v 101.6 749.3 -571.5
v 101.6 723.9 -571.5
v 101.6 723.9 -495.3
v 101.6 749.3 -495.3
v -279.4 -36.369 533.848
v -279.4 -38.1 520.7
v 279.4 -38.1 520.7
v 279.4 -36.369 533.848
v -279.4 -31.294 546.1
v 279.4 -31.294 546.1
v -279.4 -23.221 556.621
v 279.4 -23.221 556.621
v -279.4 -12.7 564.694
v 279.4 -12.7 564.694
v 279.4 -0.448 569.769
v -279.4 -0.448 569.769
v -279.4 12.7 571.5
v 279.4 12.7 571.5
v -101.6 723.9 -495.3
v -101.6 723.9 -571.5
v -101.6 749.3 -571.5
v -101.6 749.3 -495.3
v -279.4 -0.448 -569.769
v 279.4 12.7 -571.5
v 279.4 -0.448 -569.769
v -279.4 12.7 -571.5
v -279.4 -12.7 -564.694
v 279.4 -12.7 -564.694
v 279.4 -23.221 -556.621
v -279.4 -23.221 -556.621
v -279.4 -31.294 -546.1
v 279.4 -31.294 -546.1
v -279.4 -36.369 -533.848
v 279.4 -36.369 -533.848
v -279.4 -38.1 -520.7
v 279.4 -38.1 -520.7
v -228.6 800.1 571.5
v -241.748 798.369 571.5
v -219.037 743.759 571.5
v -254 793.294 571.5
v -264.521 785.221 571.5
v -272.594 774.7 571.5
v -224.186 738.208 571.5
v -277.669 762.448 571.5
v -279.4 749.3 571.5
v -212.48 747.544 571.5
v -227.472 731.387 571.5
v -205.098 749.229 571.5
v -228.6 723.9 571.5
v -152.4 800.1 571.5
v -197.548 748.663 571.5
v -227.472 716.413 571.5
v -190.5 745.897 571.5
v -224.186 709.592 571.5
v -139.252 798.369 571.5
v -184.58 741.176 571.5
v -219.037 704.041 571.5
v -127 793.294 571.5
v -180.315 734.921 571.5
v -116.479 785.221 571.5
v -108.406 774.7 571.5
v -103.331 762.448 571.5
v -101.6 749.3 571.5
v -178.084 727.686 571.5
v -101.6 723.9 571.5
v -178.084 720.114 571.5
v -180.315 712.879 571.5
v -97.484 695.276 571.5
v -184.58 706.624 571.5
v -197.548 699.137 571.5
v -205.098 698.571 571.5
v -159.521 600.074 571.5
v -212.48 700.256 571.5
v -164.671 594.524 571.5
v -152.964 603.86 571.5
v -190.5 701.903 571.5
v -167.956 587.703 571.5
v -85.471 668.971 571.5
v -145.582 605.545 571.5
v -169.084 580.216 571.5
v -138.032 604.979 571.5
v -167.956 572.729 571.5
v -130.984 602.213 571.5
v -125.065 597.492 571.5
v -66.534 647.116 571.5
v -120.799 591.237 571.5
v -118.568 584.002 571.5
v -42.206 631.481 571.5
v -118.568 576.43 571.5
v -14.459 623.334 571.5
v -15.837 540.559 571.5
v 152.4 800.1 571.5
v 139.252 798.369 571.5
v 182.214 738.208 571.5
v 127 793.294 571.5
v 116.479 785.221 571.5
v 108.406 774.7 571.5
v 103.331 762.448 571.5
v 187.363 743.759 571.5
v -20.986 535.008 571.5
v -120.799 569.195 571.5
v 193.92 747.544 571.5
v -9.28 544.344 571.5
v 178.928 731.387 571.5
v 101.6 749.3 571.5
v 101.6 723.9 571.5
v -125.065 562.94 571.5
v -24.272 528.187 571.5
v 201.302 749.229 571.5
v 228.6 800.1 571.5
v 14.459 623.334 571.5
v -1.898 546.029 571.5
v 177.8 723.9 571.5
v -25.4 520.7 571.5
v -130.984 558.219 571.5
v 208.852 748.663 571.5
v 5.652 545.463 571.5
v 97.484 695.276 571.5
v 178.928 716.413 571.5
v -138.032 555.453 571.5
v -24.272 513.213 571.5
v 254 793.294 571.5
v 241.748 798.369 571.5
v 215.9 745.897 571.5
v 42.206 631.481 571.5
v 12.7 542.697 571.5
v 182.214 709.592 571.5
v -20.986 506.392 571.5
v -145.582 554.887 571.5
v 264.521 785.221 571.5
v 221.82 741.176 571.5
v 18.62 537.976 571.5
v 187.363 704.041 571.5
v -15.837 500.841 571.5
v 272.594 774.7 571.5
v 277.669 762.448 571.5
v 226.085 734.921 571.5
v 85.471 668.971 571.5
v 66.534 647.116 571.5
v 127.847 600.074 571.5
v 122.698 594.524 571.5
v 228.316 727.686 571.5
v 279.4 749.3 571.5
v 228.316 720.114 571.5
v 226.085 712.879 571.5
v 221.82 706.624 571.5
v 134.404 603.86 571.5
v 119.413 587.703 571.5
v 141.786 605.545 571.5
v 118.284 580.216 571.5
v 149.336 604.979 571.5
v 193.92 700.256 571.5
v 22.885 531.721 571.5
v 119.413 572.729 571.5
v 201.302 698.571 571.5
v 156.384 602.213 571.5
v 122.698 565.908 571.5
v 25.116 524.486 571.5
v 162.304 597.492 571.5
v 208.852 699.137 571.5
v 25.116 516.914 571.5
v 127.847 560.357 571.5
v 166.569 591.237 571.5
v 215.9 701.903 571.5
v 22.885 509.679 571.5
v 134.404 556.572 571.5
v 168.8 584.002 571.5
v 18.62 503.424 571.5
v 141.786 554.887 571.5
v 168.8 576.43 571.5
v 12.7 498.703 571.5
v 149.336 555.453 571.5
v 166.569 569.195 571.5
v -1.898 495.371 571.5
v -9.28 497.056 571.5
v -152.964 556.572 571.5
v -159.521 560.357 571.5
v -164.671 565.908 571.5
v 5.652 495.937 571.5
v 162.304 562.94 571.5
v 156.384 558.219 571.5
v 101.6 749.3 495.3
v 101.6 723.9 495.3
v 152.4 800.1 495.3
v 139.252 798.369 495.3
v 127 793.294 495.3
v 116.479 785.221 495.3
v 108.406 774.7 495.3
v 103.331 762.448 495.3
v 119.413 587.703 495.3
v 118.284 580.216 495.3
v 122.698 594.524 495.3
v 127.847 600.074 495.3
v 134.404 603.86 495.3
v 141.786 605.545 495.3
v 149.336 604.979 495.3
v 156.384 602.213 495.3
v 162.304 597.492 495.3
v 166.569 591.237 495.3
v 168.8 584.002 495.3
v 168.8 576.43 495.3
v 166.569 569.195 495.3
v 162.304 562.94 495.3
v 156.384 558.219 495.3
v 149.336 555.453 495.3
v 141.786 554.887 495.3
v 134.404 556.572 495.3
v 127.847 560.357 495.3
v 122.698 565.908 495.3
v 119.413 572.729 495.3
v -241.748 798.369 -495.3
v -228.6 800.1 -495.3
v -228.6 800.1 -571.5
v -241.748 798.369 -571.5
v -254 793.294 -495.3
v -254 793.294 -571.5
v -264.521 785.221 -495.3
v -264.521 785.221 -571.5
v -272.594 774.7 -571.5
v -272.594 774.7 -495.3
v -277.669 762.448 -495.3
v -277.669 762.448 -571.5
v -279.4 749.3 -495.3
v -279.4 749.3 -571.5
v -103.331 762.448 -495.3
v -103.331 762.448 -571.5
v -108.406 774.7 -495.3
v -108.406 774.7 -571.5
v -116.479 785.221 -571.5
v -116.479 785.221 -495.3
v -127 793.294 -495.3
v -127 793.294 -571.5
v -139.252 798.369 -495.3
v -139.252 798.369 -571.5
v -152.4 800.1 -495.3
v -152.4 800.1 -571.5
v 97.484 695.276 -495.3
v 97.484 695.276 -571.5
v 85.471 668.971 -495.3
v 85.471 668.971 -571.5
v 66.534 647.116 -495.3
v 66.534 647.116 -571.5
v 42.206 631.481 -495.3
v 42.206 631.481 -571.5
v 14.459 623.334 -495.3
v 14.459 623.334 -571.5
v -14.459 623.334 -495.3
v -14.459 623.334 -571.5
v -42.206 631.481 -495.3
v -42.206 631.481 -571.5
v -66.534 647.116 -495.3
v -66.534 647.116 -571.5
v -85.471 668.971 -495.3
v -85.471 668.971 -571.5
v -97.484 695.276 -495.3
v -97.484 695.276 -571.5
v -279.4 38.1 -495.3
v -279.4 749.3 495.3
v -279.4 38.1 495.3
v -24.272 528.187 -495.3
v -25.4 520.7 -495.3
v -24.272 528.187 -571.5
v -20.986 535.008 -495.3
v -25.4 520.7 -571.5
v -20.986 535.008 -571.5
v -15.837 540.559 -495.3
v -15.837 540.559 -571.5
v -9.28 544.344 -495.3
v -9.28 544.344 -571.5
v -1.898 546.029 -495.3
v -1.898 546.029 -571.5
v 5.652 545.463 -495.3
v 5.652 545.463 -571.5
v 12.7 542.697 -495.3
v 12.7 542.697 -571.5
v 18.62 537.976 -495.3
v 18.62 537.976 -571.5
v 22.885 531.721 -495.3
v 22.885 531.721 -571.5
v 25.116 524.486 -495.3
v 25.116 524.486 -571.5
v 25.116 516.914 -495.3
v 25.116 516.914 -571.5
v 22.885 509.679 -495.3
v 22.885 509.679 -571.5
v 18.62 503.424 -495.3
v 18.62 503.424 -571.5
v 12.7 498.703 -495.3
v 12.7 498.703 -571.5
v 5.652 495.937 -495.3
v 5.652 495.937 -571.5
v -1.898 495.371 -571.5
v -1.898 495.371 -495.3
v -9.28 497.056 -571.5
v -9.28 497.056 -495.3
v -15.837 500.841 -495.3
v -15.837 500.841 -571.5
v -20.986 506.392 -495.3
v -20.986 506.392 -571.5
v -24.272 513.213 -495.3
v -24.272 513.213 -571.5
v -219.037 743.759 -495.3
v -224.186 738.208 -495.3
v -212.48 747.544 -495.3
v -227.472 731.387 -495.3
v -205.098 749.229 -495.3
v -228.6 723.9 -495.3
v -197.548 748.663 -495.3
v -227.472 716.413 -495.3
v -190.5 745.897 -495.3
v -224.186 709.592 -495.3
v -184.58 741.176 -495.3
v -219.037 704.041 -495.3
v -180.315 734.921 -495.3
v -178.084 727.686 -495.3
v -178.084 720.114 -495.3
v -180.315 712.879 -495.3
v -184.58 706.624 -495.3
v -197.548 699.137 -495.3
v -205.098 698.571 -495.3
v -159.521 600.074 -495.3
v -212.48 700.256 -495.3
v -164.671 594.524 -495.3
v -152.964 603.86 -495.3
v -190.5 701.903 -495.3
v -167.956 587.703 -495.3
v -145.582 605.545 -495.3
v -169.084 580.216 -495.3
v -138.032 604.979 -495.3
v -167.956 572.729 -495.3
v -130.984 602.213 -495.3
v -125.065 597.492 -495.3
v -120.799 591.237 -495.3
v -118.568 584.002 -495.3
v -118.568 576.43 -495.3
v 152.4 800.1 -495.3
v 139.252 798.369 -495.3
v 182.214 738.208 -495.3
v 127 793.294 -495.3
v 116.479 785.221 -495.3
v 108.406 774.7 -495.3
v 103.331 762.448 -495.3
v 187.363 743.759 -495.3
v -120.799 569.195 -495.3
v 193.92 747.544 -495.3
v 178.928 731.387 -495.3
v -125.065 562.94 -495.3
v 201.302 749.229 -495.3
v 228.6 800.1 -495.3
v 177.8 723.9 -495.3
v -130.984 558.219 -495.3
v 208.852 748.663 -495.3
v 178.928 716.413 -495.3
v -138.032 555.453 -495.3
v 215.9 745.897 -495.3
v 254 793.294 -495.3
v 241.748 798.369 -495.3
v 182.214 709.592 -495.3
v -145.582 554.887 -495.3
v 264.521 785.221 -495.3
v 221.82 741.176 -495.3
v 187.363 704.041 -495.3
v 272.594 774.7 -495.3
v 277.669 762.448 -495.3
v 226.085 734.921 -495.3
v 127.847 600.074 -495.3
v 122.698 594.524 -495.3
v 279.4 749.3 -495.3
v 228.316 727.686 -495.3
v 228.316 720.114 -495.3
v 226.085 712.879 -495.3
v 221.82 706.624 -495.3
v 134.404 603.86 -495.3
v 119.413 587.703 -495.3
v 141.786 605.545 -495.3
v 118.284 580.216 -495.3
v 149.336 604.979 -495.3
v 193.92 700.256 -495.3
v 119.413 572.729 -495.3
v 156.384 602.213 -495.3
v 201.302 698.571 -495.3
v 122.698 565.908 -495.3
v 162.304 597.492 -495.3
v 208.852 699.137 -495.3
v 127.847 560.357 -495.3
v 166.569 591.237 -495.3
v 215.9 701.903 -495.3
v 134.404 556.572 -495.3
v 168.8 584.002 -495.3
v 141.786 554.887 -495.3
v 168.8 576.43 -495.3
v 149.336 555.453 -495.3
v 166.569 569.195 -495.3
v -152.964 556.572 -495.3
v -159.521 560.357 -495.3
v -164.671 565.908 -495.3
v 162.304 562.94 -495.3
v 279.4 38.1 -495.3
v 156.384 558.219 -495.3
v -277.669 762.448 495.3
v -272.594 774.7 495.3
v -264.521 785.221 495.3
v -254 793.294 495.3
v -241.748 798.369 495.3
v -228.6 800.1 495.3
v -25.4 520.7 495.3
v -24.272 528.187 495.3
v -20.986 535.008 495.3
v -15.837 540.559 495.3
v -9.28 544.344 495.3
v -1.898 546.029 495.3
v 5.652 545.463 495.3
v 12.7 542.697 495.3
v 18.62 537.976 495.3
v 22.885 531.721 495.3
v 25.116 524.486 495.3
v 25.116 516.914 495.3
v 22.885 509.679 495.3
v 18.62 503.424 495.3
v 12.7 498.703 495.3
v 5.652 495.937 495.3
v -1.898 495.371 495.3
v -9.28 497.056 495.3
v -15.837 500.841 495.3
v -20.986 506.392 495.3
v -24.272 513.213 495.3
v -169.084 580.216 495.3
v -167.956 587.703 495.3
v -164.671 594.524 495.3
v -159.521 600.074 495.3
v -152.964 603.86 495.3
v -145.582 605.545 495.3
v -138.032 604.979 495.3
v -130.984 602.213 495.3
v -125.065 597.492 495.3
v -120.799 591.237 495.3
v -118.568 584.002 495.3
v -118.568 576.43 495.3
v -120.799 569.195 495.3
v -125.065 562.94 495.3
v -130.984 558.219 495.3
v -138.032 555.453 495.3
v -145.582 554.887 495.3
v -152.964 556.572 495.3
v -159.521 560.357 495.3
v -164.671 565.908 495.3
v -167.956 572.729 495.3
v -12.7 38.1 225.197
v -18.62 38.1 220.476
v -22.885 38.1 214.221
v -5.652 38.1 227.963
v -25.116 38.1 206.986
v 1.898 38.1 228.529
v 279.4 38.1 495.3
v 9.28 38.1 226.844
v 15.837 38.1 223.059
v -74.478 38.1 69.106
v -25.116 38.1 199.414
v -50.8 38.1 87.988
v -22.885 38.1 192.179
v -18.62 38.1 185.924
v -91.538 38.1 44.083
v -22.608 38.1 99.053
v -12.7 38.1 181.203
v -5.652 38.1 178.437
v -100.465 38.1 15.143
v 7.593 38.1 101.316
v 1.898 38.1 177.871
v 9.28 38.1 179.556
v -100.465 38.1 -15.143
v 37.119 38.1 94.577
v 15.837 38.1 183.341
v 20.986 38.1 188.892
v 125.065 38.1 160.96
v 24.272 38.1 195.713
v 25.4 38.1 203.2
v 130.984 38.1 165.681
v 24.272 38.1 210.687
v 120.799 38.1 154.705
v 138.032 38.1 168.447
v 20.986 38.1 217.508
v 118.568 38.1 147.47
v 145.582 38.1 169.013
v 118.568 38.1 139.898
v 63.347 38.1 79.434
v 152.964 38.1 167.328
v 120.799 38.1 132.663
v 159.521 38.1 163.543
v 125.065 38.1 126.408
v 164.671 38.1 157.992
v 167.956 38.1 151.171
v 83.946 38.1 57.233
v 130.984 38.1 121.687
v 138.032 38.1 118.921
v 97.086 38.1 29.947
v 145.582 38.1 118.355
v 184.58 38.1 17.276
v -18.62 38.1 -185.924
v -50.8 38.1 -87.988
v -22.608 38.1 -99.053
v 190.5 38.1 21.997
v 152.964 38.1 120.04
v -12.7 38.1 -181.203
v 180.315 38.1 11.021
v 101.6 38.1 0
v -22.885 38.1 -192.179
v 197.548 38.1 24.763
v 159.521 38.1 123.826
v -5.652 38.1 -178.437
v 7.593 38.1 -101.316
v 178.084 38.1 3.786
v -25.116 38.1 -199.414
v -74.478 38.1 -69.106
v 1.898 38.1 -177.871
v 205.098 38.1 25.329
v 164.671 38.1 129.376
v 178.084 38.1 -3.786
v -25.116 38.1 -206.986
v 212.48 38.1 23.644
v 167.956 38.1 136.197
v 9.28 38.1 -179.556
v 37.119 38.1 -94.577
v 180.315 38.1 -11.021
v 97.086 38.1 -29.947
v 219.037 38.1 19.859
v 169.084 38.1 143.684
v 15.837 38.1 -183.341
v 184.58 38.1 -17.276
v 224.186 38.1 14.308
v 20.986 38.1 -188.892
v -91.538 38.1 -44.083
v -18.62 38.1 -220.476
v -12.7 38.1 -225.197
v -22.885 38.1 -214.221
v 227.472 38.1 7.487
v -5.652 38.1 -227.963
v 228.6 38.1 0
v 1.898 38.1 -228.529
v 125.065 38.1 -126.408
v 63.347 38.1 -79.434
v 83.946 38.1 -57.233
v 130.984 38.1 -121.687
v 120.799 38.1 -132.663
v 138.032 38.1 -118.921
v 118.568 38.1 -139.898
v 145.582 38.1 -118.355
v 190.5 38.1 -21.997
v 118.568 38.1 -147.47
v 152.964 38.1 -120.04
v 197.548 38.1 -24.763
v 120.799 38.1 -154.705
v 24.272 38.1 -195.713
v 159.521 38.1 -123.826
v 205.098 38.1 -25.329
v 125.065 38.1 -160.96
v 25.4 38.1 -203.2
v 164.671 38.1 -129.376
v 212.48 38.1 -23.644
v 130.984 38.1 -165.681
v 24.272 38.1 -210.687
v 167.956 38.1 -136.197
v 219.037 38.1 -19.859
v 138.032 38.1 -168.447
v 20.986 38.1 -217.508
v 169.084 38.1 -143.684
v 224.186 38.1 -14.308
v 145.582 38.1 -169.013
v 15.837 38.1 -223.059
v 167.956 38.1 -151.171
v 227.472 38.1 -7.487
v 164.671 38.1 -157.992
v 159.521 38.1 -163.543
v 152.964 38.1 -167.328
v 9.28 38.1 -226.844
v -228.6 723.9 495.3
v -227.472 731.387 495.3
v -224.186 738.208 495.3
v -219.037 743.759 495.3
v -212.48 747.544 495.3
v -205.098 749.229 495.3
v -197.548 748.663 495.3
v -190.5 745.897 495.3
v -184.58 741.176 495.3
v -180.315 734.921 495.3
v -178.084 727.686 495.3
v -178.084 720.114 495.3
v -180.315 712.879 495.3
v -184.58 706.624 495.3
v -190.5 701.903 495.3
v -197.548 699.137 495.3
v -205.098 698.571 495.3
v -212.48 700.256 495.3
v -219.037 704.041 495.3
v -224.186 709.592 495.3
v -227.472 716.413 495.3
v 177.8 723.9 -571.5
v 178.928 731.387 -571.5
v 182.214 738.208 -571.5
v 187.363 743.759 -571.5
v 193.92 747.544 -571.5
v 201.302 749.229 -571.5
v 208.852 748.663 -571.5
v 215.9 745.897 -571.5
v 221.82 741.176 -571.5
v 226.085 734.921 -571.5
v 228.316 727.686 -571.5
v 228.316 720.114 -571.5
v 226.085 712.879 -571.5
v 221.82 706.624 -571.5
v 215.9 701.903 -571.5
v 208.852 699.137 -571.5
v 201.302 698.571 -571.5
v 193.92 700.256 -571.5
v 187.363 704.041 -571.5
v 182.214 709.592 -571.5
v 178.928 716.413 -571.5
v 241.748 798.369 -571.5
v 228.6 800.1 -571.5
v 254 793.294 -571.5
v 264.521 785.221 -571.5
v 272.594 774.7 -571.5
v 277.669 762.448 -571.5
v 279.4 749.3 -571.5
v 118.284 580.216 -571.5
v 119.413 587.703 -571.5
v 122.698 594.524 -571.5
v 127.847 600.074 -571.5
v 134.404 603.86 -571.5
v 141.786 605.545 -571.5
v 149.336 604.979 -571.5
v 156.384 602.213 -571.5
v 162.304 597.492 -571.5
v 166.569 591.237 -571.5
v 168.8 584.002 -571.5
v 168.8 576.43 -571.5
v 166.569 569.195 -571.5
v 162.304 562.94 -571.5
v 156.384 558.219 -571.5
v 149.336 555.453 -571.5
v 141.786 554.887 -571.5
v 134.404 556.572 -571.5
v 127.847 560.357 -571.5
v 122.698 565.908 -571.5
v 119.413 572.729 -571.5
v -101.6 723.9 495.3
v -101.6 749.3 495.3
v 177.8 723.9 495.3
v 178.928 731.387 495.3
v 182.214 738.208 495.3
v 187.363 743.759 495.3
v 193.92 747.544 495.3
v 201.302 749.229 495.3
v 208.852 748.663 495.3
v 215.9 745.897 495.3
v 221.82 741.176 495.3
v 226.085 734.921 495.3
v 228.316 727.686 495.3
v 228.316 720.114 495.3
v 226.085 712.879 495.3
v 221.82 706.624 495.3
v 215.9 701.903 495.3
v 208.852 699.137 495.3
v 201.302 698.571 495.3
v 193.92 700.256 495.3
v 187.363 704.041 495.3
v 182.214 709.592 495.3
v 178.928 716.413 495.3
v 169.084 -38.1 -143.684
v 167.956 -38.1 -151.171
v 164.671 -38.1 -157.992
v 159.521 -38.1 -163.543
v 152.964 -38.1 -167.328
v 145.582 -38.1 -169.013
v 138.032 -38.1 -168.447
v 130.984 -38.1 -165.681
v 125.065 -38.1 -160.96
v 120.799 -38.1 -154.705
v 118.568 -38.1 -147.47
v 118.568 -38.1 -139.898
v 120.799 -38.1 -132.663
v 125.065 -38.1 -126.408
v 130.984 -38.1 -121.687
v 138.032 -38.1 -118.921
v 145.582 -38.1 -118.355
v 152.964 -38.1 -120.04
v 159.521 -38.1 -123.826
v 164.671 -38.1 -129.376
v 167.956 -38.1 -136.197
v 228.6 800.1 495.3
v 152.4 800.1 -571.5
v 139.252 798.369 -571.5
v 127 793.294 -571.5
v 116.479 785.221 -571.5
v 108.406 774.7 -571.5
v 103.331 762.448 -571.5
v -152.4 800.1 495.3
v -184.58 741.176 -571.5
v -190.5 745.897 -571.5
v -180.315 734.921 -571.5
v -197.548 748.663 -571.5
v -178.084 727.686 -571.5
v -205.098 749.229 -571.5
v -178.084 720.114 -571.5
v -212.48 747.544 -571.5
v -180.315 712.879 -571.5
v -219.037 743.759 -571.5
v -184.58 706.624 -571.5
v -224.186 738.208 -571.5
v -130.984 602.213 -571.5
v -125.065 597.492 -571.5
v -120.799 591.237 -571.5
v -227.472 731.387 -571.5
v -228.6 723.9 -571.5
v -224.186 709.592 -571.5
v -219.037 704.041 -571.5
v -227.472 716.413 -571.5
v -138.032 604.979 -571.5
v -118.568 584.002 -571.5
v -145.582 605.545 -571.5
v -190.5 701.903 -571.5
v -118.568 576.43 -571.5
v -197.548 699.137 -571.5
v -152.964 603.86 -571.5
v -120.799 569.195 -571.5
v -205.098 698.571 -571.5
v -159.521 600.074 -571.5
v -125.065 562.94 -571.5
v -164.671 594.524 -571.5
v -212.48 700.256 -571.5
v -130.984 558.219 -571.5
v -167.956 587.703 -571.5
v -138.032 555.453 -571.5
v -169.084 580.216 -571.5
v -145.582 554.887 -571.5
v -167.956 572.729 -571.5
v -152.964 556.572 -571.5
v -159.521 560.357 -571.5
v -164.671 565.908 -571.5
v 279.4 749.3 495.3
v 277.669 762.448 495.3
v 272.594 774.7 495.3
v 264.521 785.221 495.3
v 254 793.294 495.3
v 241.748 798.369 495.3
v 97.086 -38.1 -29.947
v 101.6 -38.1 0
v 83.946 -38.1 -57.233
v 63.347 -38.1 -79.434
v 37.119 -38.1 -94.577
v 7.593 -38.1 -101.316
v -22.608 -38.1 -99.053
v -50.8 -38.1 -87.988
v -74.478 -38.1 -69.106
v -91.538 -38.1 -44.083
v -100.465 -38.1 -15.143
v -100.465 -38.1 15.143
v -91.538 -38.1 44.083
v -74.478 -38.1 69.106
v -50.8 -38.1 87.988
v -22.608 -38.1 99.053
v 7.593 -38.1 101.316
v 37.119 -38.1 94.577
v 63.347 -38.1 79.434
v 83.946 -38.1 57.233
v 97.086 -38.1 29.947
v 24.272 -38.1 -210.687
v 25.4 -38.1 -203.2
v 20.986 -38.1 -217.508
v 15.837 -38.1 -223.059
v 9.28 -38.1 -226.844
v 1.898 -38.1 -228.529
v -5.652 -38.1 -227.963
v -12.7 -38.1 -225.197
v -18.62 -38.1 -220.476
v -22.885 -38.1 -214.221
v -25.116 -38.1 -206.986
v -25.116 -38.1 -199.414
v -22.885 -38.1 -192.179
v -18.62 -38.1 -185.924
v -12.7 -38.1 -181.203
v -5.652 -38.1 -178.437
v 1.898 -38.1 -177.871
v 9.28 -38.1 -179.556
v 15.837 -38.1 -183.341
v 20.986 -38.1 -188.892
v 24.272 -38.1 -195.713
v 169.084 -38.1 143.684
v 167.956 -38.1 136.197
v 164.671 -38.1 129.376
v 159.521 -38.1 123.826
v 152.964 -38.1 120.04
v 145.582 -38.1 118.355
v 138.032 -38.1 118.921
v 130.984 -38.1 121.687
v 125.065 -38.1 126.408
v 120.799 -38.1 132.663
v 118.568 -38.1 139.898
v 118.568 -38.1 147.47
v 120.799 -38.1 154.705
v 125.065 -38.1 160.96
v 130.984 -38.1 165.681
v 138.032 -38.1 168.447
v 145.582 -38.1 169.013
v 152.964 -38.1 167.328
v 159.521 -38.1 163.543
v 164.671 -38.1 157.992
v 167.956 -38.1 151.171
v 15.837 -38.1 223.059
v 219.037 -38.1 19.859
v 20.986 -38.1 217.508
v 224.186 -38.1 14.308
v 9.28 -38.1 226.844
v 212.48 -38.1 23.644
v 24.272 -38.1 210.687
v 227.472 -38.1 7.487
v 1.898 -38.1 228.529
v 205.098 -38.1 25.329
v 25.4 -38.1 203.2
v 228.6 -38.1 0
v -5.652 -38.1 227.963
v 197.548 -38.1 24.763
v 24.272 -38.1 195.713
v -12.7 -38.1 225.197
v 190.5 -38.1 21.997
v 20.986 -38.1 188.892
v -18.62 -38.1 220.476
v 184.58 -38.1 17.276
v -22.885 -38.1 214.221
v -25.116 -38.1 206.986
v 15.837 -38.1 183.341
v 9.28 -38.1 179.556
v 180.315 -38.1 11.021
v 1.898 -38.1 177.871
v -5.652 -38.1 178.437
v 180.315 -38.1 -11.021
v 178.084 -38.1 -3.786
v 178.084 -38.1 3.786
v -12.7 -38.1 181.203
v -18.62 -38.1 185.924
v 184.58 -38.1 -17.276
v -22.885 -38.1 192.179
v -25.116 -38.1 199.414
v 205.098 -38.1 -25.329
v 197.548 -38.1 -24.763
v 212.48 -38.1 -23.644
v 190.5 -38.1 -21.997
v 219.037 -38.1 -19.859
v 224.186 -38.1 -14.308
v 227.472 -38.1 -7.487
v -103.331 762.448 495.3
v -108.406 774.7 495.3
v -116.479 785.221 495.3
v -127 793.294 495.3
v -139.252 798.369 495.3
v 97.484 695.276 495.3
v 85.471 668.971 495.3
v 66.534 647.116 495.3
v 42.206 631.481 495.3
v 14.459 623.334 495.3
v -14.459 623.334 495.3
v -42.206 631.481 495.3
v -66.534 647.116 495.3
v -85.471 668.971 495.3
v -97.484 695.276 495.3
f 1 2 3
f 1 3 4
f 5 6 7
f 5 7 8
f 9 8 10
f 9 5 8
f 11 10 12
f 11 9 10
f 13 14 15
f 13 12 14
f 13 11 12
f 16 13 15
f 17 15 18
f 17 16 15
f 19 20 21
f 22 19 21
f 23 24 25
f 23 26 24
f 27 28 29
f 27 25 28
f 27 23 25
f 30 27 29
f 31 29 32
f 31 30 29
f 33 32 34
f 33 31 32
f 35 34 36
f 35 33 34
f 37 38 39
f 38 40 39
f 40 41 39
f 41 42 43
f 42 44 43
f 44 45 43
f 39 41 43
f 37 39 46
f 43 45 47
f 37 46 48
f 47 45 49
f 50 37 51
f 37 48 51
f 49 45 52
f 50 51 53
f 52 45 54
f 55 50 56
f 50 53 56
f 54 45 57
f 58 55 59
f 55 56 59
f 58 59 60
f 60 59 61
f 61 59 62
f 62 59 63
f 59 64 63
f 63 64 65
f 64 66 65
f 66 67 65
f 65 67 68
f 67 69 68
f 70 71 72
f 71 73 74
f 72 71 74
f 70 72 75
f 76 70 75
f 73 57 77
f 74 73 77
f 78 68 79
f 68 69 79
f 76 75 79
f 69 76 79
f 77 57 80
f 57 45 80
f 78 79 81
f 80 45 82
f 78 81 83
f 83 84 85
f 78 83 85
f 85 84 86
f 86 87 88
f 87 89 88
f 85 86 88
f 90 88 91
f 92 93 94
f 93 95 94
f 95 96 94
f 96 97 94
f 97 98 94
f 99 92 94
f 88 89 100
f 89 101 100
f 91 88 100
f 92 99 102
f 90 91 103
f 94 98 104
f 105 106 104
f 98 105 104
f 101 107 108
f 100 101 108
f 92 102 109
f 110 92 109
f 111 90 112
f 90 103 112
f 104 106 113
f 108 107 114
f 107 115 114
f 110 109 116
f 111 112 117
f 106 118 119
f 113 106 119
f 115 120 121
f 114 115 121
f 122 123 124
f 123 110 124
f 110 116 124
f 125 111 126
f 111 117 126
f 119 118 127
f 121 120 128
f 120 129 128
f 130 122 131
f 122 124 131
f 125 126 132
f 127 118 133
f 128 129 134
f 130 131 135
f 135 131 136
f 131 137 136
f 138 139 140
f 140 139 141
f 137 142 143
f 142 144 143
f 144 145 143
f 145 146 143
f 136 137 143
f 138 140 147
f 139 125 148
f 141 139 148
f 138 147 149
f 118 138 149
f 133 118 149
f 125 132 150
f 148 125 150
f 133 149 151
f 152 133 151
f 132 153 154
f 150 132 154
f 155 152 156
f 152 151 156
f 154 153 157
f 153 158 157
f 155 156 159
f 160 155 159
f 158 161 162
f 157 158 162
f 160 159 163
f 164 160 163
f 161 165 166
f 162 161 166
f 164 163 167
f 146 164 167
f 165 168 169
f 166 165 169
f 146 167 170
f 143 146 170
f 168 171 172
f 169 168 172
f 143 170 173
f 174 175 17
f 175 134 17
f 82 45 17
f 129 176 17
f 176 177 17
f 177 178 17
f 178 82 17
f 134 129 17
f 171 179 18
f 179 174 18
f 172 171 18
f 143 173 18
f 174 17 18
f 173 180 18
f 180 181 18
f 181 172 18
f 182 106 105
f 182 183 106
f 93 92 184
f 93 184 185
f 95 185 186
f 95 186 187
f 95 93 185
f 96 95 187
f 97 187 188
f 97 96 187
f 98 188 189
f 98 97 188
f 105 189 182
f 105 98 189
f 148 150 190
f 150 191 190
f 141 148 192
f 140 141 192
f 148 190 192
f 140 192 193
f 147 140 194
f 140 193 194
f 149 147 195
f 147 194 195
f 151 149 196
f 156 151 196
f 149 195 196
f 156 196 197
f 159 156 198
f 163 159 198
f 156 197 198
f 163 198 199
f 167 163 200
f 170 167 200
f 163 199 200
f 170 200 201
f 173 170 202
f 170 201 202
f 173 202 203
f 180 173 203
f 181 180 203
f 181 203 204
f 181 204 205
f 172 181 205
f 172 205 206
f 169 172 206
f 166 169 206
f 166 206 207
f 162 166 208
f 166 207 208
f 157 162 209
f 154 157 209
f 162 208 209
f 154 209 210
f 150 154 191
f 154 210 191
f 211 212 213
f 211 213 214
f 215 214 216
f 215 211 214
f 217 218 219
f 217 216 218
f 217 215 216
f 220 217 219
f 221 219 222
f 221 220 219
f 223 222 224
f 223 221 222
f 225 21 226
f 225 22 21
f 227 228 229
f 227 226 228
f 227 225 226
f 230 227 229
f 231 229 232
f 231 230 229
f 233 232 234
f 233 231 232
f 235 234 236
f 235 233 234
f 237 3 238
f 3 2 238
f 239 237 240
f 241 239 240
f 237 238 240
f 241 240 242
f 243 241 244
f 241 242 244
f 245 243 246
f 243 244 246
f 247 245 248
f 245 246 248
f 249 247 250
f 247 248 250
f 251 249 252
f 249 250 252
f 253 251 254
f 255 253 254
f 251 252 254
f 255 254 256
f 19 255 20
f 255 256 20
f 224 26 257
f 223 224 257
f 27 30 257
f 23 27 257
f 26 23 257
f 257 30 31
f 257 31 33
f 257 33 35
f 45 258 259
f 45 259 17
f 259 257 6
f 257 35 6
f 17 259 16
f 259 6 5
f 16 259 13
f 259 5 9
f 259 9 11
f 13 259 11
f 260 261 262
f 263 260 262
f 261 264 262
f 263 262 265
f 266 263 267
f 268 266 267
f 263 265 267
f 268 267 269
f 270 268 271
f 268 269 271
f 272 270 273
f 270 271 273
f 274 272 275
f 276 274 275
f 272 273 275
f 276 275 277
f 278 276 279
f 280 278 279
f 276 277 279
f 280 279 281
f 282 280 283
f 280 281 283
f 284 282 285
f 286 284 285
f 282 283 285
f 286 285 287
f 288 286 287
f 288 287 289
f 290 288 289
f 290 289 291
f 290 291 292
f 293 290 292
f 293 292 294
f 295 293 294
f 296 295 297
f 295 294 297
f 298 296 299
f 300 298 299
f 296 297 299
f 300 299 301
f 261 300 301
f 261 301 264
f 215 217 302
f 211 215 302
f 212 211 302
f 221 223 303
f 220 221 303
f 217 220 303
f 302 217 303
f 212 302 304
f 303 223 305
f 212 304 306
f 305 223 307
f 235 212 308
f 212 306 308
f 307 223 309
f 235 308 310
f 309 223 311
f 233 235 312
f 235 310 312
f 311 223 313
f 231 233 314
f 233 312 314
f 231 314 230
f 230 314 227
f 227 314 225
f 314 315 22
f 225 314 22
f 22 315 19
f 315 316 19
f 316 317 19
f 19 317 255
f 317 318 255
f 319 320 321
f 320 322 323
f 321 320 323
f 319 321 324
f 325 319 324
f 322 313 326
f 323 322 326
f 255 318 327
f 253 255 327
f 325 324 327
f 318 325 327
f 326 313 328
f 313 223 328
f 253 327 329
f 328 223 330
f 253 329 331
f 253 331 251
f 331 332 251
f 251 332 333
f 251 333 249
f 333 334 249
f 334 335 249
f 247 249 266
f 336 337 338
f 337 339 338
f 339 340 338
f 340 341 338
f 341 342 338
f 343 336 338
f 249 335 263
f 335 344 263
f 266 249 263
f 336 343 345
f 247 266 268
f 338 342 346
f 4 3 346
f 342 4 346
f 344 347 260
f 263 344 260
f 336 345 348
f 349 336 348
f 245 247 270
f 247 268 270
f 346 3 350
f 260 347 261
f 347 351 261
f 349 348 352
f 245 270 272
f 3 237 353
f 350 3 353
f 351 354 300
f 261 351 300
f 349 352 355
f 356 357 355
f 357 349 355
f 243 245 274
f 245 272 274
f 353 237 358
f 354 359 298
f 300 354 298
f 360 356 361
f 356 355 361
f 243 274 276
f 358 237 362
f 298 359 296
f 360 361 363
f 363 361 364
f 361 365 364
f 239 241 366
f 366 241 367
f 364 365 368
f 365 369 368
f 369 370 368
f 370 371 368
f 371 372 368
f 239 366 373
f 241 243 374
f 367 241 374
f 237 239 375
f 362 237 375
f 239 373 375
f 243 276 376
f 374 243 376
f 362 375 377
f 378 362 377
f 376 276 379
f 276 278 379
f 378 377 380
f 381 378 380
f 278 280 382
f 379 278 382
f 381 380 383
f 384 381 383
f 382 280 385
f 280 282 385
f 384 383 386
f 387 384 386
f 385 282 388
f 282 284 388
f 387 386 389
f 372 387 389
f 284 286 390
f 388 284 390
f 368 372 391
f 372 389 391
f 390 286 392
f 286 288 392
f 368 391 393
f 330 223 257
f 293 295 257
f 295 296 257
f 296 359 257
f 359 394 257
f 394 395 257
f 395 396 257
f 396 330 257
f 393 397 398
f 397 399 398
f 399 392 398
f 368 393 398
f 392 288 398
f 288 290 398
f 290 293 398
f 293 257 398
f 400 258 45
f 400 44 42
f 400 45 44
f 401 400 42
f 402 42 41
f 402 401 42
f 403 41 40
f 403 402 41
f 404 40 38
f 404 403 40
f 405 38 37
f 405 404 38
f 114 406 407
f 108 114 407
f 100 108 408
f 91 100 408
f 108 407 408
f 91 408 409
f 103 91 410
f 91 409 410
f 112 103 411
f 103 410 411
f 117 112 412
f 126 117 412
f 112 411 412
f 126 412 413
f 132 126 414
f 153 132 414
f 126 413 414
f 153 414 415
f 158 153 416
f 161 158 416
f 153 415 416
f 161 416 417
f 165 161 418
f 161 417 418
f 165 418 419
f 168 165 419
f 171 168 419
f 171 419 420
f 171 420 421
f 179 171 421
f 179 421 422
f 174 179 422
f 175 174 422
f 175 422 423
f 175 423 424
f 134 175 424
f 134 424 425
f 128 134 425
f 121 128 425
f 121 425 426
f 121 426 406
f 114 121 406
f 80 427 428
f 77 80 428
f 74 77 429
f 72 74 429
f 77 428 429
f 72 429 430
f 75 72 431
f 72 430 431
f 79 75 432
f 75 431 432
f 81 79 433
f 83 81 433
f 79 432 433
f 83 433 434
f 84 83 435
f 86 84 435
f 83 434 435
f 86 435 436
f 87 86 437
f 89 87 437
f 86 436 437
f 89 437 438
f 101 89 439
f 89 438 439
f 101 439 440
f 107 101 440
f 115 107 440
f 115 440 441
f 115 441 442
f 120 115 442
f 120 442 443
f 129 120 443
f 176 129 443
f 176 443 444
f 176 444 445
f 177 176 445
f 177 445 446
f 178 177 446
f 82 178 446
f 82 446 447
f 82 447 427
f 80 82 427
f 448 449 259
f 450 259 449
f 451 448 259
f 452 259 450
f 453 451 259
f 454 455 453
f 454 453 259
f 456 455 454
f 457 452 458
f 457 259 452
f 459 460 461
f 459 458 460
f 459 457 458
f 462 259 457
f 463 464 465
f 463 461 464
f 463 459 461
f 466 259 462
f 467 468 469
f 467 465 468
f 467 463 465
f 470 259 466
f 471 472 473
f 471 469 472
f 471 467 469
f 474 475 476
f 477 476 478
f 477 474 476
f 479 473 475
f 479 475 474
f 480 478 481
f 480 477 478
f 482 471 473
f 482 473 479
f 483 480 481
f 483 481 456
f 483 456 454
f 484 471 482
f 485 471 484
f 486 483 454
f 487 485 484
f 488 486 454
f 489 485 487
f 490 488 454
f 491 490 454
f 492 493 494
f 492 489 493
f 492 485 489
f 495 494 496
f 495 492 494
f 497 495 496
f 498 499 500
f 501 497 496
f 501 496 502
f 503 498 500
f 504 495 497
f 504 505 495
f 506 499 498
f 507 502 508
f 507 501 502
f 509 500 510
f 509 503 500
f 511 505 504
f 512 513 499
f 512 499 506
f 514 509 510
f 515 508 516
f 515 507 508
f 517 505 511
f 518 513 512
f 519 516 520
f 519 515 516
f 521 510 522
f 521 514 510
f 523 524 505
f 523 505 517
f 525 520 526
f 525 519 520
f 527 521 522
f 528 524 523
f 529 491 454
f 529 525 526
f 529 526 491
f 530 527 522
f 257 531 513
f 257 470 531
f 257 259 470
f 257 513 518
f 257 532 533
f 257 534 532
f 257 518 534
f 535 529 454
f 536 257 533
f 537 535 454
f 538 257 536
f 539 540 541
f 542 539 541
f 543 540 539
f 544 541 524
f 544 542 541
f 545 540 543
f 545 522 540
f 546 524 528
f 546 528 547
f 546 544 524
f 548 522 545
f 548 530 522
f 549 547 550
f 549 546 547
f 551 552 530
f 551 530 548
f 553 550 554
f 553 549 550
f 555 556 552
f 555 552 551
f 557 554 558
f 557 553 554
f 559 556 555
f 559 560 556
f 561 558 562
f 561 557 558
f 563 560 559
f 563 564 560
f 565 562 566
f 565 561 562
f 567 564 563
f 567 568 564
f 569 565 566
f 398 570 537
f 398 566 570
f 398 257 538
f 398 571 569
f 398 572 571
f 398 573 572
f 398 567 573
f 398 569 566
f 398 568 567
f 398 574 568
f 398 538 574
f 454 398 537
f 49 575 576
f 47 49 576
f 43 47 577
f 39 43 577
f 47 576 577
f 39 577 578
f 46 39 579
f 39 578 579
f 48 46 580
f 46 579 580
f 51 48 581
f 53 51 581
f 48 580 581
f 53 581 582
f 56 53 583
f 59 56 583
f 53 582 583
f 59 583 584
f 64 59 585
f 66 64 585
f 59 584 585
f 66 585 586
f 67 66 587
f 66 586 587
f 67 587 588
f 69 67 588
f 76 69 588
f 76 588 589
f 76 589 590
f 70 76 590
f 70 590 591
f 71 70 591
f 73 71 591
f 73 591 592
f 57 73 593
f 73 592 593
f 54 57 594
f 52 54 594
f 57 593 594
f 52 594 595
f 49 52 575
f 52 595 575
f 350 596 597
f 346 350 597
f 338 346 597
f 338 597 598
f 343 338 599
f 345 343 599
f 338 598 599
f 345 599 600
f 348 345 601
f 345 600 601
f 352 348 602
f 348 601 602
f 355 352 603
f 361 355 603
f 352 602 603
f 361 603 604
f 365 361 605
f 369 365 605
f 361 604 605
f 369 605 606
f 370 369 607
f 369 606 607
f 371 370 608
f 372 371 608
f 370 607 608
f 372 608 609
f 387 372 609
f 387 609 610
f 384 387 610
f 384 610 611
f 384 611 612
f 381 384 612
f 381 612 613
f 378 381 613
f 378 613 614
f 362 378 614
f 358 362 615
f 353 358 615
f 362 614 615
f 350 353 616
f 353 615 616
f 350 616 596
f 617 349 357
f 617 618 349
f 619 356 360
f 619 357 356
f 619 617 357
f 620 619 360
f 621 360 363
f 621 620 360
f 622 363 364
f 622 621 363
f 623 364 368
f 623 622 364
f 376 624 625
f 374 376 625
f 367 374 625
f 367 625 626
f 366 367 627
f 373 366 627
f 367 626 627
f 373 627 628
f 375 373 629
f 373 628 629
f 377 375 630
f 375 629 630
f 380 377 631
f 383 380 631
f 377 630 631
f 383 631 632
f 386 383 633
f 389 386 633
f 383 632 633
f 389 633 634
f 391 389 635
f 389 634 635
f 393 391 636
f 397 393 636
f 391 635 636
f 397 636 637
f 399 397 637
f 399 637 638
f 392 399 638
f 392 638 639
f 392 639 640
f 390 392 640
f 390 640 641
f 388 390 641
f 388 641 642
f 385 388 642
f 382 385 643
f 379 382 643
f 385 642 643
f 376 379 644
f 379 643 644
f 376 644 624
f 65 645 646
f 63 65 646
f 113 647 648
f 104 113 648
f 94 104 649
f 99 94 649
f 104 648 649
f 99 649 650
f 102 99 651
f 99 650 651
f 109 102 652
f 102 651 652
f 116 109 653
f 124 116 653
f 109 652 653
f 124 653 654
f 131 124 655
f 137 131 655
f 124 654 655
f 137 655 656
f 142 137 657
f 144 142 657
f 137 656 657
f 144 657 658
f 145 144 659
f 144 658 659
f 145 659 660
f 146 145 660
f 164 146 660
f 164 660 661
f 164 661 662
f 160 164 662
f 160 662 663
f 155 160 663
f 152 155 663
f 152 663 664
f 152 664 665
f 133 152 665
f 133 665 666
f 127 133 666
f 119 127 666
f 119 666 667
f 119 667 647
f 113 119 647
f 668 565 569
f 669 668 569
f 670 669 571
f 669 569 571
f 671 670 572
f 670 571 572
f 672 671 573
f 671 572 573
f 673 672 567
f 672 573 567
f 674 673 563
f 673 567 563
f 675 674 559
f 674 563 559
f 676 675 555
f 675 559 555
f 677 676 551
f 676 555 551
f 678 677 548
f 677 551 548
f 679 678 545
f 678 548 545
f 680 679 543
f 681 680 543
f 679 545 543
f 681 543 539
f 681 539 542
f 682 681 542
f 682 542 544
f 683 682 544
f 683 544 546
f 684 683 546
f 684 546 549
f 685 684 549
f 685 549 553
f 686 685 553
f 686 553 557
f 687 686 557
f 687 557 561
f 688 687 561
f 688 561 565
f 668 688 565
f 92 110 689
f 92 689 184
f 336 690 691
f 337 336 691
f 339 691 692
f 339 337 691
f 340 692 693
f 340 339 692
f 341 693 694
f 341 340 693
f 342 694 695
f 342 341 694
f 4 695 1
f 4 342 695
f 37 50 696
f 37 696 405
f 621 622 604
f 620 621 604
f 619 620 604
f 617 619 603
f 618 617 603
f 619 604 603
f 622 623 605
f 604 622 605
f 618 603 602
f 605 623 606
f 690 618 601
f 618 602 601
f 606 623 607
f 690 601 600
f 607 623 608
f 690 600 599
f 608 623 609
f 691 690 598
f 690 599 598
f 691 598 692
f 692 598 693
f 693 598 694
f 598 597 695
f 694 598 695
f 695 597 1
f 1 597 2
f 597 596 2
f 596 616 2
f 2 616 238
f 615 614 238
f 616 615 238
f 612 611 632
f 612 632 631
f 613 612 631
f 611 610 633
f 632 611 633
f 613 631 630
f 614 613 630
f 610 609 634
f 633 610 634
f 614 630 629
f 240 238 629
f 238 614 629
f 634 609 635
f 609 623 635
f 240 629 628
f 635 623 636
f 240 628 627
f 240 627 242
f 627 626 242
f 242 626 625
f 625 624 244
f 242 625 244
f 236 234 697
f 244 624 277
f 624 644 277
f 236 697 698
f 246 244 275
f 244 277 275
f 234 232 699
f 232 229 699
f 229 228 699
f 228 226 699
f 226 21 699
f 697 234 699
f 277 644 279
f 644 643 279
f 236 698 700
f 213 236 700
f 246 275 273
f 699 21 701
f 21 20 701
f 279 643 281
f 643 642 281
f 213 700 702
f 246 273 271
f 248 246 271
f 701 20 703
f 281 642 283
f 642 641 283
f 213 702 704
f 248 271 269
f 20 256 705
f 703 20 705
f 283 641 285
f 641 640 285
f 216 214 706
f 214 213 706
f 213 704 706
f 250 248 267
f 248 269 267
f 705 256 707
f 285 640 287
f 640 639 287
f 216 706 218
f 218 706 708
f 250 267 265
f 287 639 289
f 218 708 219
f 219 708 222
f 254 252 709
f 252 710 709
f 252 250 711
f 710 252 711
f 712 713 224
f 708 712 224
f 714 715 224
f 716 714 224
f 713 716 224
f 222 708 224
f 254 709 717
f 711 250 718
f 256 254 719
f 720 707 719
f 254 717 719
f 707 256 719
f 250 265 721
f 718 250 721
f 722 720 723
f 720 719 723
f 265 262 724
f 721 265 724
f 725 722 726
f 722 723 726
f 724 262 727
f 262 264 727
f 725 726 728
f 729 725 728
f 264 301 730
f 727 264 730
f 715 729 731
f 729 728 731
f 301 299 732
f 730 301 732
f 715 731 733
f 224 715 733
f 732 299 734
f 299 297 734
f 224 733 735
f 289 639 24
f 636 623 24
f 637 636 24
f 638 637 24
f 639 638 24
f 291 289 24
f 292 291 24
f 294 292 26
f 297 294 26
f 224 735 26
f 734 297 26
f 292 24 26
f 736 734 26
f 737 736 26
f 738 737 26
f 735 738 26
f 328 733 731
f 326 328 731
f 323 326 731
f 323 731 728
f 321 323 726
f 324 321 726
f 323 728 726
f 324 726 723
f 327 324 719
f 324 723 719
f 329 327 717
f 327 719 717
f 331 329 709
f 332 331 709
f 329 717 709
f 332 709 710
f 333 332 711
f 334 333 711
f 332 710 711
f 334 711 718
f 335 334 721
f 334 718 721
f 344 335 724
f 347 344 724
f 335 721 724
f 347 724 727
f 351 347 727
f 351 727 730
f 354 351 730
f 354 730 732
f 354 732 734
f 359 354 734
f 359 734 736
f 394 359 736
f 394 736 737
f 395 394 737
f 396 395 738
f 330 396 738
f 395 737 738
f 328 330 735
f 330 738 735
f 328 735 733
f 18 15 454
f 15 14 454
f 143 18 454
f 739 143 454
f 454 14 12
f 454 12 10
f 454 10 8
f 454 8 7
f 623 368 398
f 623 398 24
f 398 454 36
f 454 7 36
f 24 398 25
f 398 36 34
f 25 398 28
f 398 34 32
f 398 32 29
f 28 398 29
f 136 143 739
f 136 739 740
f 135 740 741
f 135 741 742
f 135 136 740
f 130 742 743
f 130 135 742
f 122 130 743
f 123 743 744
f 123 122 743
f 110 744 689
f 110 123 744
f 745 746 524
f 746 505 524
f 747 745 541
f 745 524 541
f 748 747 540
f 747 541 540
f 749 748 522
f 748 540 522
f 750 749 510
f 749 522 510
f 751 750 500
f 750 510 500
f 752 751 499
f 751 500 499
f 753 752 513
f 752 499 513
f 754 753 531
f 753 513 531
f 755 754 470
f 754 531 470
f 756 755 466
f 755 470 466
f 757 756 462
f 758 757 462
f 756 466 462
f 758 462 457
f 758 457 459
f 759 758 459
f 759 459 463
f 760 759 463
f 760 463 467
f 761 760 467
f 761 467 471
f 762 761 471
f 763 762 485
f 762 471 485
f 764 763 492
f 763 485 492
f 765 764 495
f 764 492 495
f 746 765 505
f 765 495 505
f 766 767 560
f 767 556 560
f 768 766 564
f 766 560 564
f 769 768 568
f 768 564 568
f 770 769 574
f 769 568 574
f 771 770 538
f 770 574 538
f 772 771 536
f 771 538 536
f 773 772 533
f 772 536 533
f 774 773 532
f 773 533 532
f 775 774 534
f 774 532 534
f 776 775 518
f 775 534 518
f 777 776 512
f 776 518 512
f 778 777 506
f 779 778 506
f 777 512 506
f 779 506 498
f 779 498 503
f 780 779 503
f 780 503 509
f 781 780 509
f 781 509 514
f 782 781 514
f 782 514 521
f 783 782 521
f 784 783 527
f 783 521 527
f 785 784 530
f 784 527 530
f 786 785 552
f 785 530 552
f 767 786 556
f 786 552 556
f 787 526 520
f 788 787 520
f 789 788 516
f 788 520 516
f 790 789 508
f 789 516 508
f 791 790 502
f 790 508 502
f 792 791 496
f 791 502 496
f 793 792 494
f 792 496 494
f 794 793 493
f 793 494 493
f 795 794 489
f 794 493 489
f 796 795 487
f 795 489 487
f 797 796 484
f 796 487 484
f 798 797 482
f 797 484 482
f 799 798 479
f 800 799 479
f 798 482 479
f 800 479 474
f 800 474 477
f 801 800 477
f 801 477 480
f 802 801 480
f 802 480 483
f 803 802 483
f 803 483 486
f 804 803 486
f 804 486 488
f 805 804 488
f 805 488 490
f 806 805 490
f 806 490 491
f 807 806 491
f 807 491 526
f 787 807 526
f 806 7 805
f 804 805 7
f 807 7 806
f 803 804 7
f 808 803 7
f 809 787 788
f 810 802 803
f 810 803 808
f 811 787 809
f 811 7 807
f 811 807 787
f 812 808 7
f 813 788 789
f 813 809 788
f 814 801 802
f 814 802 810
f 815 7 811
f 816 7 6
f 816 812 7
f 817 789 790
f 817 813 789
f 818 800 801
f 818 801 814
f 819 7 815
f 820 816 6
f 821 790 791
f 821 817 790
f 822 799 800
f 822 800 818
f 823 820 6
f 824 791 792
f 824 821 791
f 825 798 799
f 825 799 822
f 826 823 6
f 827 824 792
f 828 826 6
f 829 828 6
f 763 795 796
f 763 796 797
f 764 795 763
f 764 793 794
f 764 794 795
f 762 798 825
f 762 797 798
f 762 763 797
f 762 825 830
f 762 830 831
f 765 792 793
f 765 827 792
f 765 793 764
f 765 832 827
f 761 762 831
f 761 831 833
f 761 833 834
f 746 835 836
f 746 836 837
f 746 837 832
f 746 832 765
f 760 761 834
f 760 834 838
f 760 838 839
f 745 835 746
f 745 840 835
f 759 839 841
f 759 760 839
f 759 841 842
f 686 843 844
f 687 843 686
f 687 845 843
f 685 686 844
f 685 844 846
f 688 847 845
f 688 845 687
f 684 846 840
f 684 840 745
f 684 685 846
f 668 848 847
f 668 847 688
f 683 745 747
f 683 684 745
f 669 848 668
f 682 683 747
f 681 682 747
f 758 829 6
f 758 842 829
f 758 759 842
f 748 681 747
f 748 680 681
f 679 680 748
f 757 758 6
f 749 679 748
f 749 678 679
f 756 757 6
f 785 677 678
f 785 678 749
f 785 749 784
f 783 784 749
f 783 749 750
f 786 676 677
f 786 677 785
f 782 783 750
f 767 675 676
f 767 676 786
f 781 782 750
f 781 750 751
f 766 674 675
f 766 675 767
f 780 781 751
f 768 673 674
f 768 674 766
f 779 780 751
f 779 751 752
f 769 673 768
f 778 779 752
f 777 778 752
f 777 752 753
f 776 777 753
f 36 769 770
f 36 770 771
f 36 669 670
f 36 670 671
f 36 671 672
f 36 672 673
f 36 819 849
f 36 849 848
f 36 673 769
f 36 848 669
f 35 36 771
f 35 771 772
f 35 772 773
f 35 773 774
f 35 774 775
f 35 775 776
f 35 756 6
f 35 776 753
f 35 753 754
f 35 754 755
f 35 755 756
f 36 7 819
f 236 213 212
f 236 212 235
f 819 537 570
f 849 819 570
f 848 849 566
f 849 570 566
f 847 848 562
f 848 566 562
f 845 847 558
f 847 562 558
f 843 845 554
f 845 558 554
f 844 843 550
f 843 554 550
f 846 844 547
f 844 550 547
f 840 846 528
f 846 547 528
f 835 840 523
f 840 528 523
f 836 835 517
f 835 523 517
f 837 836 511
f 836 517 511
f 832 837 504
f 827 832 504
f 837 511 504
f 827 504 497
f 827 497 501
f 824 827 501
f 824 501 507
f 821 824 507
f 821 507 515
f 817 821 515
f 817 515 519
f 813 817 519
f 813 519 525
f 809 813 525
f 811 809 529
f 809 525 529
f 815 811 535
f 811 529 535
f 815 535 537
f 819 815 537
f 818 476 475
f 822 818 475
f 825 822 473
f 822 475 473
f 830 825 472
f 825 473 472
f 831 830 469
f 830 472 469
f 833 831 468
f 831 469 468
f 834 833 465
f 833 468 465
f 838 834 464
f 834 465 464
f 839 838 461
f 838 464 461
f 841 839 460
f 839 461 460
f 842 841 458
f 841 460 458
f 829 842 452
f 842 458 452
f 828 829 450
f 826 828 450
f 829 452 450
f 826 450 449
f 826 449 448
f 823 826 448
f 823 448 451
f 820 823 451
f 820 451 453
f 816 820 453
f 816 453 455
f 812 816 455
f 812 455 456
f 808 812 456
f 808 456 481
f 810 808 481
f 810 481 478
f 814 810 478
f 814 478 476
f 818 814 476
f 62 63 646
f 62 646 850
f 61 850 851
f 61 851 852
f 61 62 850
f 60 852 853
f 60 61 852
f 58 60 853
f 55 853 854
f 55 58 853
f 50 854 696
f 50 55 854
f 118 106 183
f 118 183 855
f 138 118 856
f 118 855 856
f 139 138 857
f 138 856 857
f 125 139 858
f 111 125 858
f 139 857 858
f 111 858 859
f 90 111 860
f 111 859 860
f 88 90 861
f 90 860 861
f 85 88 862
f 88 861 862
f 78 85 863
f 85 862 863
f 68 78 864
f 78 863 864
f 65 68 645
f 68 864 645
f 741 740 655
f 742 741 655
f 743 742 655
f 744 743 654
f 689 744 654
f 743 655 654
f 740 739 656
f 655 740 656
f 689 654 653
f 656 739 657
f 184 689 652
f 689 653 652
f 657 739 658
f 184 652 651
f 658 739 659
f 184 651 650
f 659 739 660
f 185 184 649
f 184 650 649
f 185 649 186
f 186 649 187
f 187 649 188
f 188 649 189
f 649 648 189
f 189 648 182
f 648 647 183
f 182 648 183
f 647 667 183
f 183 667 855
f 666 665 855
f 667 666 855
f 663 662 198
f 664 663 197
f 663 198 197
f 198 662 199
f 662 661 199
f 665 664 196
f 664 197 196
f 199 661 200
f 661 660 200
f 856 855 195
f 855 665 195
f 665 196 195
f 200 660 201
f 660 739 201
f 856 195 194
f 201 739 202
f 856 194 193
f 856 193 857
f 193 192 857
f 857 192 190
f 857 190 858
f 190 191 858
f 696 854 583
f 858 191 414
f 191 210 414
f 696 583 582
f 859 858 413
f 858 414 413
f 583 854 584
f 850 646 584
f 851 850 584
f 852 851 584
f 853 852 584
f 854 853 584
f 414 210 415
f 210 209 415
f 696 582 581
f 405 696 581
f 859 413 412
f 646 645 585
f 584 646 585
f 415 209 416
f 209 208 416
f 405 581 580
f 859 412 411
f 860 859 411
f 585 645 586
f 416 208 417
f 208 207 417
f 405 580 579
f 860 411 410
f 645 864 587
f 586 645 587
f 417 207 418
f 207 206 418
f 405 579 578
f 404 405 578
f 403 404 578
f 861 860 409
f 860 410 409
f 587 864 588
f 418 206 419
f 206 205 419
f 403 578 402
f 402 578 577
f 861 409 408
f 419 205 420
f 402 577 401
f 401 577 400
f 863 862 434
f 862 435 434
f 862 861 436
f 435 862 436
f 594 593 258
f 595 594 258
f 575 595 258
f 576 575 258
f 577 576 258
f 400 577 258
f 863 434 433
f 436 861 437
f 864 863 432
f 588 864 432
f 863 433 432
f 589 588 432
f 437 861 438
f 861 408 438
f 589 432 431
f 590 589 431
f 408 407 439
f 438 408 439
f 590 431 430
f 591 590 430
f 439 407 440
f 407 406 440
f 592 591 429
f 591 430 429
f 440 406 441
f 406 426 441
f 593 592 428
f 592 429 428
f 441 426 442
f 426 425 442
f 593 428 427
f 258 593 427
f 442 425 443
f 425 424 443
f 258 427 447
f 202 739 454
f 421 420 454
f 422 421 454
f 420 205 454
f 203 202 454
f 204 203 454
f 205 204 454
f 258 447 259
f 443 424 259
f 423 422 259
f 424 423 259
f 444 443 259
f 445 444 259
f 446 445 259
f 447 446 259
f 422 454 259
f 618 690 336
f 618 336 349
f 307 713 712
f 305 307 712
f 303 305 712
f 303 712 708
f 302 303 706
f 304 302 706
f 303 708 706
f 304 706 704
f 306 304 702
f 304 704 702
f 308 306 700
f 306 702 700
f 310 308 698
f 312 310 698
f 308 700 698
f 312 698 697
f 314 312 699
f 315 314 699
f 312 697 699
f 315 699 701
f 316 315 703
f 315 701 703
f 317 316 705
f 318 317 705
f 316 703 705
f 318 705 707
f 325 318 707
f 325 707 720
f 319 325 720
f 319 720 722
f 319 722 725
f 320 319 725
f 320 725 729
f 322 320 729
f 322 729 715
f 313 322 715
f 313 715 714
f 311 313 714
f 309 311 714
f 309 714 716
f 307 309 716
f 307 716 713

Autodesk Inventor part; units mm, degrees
ref_plane "YZ Plane" through (0, 0, 0) normal (1, 0, 0) x (0, 1, 0)
ref_plane "XZ Plane" through (0, 0, 0) normal (0, 1, 0) x (-1, 0, 0)
ref_plane "XY Plane" through (0, 0, 0) normal (0, 0, 1) x (1, 0, 0)
sketch "Sketch1" plane through (0, 0, 0) normal (0, 0, 1) x (1, 0, 0)
  line L0 (-279.4, 38.1) -> (279.4, 38.1)
  line L1 (279.4, 38.1) -> (279.4, -38.1)
  line L2 (279.4, -38.1) -> (-279.4, -38.1)
  line L3 (-279.4, -38.1) -> (-279.4, 38.1)
  line L4 (0, 0) -> (0, 412.8984) construction
  line L5 (0, 0) -> (748.8943, 0) construction
  dimension "d0" = 558.8
  dimension "d1" = 76.2
  dimension "d2" = 38.1
  dimension "d4" = 279.4
extrude "Extrusion1" add sketch "Sketch1" along normal mid plane 1143
sketch "Sketch2" plane through (-279.4, 38.1, 571.5) normal (0, 1, 0) x (1, 0, 0)
  line L0 (558.8, 0) -> (558.8, 1143) projected
  line L1 (0, 1143) -> (0, 0) projected
  line L2 (558.8, 1143) -> (0, 1143)
  line L3 (0, 1143) -> (0, 1066.8)
  line L4 (0, 1066.8) -> (558.8, 1066.8)
  line L5 (558.8, 1066.8) -> (558.8, 1143)
  point P0 (279.4, 571.5)
  dimension "d7" = 76.2
extrude "Extrusion2" add sketch "Sketch2" along normal blind 762
mirror "Mirror1" about plane through (0, 0, 0) normal (0, 0, 1) of "Extrusion2"
sketch "Sketch3" plane through (-279.4, 38.1, -495.3) normal (0, 1, 0) x (1, 0, 0)
  circle A0 centre (279.4, -495.3) radius 101.6
  circle A1 centre (279.4, -292.1) radius 25.4
  line L0 (558.8, -990.6) -> (558.8, 0) projected
  circle A2 centre (423.0841, -351.6159) radius 25.4
  circle A3 centre (482.6, -495.3) radius 25.4
  circle A4 centre (423.0841, -638.9841) radius 25.4
  circle A5 centre (279.4, -698.5) radius 25.4
  dimension "d10" = 203.2
  dimension "d11" = 50.8
  dimension "d12" = 203.2
  dimension "d13" = 279.4
  dimension "d16" = 180
extrude "Extrusion3" cut sketch "Sketch3" against normal through all
sketch "Sketch4" plane through (0, 0, -571.5) normal (0, 0, -1) x (-1, 0, 0)
  line L0 (-314.4934, 723.9) -> (334.7896, 723.9) construction
  line L1 (279.4, 800.1) -> (-279.4, 800.1) construction
  arc A0 (-101.6, 723.9) -> (101.6, 723.9) centre (0, 723.9) ccw
  line L2 (279.4, -38.1) -> (279.4, 800.1) projected
  line L3 (-279.4, 800.1) -> (279.4, 800.1) projected
  line L4 (101.6, 723.9) -> (101.6, 800.1)
  line L5 (-101.6, 723.9) -> (-101.6, 800.1)
  circle A1 centre (-203.2, 723.9) radius 25.4
  circle A2 centre (-143.6841, 580.2159) radius 25.4
  circle A3 centre (0, 520.7) radius 25.4
  circle A4 centre (143.6841, 580.2159) radius 25.4
  circle A5 centre (203.2, 723.9) radius 25.4
  point P0 (0, 0)
  dimension "d20" = 76.2
  dimension "d21" = 203.2
  dimension "d22" = 279.4
  dimension "d23" = 50.8
  dimension "d24" = 203.2
  dimension "d27" = 180
extrude "Extrusion4" cut sketch "Sketch4" against normal through all
fillet "Fillet1" radius 50.8 10 edges at (101.6, 800.1, -533.4) (-101.6, 800.1, -533.4) (-101.6, 800.1, 533.4) (101.6, 800.1, 533.4) (279.4, 800.1, 533.4) (-279.4, 800.1, 533.4) (279.4, 800.1, -533.4) (-279.4, 800.1, -533.4) (0, -38.1, -571.5) (0, -38.1, 571.5)
properties part number "Down_Part_Robot"
